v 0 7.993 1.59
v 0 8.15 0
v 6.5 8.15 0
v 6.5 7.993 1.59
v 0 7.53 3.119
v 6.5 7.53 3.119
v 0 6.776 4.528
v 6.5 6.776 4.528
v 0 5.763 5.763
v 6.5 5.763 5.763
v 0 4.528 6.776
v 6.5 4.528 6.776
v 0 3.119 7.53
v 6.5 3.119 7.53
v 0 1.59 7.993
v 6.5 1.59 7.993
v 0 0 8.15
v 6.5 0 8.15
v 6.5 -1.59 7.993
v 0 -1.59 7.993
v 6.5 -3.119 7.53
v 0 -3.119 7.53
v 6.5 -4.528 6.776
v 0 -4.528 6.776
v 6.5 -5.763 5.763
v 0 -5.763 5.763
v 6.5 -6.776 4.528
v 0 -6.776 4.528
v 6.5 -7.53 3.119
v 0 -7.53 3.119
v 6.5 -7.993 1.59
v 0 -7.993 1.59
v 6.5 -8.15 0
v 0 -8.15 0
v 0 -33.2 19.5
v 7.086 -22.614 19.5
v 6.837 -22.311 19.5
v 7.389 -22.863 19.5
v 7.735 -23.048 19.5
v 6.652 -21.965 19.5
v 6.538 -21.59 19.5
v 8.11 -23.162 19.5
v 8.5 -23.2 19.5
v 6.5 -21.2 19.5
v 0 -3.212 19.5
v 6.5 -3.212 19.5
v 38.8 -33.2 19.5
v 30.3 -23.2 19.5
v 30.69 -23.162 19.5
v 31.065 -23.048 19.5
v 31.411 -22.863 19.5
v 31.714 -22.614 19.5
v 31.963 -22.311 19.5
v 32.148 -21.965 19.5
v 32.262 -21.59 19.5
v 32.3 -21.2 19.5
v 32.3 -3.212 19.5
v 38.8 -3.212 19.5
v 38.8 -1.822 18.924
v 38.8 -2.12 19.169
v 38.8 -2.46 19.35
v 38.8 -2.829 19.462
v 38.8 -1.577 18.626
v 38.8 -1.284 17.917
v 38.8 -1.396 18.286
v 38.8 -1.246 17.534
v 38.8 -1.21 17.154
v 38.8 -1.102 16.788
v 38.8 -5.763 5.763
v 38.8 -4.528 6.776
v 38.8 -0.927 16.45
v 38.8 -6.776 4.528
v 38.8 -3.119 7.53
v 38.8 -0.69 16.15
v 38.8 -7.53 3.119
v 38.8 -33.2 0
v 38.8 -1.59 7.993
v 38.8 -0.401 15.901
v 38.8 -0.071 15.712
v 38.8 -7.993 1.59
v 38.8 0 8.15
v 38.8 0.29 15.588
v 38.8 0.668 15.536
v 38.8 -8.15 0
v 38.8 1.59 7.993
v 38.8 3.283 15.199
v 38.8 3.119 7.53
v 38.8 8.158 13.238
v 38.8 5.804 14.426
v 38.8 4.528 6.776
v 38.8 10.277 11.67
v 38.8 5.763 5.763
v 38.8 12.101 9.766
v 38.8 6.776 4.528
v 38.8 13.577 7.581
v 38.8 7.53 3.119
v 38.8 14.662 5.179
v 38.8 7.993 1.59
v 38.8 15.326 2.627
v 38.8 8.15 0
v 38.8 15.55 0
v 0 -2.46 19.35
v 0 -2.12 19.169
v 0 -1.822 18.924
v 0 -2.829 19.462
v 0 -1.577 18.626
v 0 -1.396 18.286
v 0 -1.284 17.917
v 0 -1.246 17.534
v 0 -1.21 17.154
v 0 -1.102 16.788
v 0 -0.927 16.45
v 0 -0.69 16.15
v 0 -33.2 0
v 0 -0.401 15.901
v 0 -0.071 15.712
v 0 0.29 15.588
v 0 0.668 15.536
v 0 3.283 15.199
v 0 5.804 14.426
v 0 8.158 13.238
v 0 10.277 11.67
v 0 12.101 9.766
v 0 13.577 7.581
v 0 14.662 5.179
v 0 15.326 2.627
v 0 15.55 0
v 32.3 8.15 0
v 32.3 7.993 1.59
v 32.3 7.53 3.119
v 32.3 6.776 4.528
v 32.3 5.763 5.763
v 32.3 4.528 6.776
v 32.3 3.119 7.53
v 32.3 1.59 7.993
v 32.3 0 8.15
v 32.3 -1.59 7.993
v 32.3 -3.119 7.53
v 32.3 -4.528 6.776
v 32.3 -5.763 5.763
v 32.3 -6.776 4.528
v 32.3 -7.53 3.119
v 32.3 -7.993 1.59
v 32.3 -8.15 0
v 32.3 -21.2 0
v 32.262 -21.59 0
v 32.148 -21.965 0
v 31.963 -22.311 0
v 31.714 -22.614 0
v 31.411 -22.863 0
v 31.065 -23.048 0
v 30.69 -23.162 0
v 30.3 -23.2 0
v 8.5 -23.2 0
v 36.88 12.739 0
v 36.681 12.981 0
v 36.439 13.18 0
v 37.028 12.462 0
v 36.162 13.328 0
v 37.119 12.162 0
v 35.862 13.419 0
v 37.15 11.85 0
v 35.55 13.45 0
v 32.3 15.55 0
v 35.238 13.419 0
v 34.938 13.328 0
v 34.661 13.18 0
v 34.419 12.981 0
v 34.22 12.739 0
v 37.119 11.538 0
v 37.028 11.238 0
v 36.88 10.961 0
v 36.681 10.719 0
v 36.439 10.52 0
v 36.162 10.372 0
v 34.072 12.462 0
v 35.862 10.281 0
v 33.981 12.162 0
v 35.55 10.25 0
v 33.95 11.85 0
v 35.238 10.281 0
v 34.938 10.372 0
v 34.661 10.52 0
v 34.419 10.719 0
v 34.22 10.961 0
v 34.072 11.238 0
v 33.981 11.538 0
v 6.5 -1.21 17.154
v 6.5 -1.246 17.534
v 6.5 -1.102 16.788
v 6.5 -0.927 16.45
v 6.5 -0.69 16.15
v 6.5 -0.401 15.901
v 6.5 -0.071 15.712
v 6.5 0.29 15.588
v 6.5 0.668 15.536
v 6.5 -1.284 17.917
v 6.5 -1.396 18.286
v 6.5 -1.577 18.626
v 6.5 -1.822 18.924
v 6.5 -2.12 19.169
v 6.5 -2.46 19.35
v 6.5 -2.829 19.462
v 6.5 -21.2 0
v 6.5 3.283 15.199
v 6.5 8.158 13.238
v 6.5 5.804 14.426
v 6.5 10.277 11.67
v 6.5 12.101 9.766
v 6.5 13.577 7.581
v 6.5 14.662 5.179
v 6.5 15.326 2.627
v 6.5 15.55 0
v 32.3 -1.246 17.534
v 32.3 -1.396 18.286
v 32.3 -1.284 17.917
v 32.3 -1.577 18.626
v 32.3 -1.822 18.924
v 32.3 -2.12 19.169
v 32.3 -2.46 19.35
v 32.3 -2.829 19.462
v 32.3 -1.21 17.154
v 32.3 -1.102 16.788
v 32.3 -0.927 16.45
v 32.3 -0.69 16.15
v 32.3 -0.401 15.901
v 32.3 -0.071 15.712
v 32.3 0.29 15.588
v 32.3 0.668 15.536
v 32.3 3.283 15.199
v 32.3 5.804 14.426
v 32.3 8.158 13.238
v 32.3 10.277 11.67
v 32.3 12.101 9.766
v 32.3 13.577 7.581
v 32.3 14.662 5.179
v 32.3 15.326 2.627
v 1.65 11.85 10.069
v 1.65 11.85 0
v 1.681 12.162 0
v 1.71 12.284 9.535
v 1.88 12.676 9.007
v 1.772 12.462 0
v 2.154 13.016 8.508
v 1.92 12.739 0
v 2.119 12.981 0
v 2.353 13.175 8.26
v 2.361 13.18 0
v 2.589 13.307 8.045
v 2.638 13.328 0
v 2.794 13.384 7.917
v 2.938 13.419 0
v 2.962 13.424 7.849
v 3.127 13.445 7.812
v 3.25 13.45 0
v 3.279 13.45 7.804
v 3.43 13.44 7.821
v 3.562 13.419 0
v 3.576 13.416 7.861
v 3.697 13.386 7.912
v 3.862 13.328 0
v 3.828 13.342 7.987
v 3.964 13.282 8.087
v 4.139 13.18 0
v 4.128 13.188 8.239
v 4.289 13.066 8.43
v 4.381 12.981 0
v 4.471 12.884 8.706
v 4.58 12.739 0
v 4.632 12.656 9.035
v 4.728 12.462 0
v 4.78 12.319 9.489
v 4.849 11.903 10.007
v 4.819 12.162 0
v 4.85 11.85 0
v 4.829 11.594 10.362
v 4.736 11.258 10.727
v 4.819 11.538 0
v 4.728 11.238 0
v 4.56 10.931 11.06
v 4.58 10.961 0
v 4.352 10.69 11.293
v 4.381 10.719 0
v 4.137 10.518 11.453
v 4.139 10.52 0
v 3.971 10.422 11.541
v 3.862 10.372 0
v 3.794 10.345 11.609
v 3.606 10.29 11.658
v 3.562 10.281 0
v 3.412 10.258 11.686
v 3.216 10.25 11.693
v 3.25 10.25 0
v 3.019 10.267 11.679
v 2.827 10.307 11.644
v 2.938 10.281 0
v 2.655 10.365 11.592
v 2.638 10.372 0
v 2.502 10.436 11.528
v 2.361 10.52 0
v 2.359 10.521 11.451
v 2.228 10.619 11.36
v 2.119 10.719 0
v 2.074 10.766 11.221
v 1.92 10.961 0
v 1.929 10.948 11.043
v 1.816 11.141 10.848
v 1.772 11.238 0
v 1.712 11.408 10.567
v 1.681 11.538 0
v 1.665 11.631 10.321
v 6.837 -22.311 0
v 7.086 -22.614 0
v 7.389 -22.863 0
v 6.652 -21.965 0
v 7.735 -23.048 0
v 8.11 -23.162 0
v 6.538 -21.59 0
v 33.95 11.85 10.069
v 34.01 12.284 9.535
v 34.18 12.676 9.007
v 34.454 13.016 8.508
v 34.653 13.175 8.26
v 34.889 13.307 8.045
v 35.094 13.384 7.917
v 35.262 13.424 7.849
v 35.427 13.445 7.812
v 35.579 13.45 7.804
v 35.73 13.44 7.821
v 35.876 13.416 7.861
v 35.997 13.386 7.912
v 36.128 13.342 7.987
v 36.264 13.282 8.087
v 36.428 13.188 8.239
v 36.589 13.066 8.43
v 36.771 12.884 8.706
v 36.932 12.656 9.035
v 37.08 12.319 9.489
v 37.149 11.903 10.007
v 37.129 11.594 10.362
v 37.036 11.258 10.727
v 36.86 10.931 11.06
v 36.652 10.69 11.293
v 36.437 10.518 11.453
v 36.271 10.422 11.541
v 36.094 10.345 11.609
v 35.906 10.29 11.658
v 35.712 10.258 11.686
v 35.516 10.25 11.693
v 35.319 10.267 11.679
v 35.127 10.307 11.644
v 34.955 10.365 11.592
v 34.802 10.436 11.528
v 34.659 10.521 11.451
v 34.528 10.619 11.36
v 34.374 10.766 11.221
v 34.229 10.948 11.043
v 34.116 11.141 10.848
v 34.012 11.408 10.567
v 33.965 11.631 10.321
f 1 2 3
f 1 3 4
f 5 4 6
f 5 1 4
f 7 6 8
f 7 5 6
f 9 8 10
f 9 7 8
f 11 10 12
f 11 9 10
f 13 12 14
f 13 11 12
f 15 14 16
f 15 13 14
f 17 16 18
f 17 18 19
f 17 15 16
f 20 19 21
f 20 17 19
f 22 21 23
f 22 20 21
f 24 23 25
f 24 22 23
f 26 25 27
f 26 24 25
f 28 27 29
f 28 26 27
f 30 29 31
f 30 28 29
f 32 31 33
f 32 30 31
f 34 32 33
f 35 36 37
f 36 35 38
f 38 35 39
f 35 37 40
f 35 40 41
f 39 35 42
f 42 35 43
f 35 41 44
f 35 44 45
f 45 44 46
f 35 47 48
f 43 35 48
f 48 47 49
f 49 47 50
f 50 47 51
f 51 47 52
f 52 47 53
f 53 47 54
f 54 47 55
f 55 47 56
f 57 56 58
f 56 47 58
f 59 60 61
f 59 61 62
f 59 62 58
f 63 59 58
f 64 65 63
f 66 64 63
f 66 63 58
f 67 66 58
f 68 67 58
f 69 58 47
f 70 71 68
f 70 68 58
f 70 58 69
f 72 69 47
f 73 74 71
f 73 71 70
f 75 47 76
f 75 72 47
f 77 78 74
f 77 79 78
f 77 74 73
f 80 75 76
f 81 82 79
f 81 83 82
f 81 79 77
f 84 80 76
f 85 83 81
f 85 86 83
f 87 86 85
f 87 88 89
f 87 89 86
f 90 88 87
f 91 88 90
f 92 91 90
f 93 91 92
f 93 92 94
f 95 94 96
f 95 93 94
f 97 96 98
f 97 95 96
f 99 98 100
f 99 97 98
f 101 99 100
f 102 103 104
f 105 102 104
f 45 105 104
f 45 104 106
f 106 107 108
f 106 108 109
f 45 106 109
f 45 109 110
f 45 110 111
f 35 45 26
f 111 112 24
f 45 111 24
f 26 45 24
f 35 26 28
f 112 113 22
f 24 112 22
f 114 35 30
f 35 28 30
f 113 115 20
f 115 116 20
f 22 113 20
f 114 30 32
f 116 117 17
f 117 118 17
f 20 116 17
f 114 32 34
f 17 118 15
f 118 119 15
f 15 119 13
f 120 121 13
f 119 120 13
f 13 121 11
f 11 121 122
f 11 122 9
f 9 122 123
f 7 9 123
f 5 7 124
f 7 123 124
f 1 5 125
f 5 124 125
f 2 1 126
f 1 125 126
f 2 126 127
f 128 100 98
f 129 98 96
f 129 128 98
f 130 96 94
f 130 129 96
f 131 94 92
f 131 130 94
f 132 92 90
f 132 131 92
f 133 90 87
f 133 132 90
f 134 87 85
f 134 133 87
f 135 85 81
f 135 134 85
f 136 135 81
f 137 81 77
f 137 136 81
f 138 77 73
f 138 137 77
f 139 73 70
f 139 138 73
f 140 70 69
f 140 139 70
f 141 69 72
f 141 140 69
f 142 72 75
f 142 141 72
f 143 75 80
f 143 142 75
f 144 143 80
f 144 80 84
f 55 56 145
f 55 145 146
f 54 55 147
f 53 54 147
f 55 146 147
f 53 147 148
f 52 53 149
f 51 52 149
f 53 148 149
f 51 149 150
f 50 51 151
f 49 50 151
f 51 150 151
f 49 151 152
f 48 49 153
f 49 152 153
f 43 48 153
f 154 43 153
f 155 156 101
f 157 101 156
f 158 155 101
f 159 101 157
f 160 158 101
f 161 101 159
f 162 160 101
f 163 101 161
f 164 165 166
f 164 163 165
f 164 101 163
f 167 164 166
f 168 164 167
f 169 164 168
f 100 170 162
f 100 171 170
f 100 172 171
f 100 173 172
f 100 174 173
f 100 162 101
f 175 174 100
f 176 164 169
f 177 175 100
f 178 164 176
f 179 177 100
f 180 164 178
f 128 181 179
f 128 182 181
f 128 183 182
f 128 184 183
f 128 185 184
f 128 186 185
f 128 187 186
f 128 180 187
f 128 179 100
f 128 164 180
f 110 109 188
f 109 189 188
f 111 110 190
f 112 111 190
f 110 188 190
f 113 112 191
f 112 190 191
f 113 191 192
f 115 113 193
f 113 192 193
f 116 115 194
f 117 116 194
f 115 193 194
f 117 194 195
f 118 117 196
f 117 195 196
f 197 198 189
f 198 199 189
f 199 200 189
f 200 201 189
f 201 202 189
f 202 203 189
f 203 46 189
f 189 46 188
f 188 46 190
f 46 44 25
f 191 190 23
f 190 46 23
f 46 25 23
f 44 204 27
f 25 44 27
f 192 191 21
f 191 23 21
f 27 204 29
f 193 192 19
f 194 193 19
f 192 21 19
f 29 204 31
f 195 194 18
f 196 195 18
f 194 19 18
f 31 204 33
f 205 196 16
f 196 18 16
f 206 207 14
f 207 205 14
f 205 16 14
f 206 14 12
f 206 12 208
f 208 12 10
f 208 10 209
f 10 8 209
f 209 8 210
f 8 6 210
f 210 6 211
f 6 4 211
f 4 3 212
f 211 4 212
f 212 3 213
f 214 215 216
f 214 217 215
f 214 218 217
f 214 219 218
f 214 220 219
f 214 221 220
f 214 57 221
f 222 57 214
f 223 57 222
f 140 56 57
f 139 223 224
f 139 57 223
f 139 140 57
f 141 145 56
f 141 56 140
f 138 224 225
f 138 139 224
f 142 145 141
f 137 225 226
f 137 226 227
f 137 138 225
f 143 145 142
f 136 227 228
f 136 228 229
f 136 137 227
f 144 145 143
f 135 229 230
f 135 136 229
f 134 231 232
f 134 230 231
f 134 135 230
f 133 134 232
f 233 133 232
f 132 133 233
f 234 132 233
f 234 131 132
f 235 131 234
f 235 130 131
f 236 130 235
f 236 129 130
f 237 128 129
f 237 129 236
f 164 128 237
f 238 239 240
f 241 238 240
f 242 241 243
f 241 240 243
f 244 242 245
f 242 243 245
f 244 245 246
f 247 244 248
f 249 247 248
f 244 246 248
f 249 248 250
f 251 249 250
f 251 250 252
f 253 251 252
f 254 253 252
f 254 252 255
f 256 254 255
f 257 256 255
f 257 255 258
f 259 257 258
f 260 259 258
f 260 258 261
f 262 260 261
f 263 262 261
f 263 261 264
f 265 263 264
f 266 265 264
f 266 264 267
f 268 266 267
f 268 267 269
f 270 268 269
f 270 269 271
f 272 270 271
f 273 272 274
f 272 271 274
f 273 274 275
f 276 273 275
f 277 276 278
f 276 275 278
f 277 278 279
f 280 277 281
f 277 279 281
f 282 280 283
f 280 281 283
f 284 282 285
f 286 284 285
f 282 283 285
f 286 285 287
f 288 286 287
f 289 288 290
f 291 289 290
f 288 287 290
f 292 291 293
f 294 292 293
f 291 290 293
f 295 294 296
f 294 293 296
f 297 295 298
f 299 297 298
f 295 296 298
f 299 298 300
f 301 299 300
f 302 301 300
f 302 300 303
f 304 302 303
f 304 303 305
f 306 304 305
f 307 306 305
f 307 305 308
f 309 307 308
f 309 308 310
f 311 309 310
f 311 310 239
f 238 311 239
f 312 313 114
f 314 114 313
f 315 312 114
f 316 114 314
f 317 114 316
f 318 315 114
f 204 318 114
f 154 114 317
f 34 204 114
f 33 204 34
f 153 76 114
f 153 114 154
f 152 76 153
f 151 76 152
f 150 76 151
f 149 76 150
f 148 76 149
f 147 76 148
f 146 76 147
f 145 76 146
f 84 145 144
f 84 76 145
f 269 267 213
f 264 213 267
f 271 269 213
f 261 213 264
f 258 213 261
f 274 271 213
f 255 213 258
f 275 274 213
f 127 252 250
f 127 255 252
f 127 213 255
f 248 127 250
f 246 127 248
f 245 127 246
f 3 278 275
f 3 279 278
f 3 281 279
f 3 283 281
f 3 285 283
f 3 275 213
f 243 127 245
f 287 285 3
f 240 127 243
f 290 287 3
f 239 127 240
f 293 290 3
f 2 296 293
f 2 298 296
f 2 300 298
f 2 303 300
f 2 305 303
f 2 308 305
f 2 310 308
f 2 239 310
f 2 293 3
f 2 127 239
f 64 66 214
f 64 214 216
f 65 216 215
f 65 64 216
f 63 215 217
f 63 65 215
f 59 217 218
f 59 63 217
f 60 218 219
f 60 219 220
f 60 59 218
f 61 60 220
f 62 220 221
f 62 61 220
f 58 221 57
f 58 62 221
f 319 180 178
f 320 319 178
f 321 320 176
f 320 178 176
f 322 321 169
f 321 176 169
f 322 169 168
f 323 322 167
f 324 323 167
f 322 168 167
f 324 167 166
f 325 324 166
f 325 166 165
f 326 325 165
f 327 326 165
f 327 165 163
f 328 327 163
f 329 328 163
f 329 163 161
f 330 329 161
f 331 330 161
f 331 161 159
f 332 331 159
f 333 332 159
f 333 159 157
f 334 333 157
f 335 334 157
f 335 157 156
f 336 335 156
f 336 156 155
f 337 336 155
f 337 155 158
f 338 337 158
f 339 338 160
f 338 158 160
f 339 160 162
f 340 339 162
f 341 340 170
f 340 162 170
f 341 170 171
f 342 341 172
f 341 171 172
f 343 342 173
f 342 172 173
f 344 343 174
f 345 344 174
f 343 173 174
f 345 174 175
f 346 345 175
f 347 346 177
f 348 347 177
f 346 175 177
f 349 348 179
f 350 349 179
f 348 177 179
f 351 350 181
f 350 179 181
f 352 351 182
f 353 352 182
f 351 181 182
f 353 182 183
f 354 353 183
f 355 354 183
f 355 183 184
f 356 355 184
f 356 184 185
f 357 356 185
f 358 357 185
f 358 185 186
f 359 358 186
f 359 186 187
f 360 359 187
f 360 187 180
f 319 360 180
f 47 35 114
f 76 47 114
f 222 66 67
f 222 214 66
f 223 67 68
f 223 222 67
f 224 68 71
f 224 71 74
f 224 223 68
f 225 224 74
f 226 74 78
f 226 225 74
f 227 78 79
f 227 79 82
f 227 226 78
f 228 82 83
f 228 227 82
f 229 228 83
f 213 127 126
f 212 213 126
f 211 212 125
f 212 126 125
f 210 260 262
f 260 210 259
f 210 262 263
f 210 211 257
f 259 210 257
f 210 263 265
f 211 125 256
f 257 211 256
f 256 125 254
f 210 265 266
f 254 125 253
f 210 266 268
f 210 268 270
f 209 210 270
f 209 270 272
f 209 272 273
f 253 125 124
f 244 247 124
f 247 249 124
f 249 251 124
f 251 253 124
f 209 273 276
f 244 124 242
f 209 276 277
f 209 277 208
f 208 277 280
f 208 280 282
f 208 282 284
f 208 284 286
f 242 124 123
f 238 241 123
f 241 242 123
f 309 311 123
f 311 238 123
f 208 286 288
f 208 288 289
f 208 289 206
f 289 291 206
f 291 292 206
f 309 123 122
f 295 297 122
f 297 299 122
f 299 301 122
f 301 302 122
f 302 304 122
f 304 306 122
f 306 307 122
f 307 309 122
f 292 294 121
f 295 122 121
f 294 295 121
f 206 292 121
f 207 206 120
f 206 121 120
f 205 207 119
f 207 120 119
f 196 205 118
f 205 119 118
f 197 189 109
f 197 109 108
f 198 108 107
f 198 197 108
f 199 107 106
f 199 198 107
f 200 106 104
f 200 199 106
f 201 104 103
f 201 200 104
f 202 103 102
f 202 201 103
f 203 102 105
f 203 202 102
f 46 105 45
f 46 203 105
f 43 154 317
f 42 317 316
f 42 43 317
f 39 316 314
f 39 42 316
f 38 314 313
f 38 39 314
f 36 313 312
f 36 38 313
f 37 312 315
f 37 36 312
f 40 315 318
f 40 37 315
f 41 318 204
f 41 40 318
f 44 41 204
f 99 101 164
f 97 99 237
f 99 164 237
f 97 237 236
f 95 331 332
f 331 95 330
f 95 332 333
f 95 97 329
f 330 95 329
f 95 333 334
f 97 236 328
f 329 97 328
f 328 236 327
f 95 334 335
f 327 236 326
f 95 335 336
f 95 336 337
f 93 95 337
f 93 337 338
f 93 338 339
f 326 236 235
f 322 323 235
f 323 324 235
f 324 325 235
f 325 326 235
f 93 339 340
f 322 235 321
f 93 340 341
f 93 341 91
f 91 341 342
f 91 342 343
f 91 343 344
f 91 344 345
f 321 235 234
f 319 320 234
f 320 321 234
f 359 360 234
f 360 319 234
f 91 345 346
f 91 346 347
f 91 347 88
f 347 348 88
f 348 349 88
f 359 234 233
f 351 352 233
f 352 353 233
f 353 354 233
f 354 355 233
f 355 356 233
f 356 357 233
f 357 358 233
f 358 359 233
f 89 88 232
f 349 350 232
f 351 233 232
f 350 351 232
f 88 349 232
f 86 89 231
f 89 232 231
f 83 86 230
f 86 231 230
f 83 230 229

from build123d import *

# Parameters (mm, degrees)
SKETCH3_R            = 15.55
SKETCH3_R_2          = 8.15
BOSS_EXTRUDE4_DEPTH  = 6.5
SKETCH2_R            = 15.55
SKETCH2_R_2          = 8.15
BOSS_EXTRUDE5_DEPTH  = 6.5
CUT_EXTRUDE1_DEPTH   = 38.8
SKETCH5_R            = 1.6
CUT_EXTRUDE2_DEPTH   = 16.55
BOSS_EXTRUDE6_DEPTH  = 6.5
SKETCH9_W            = 6.5
SKETCH9_H            = 21.954006421
BOSS_EXTRUDE7_DEPTH  = 4
BOSS_EXTRUDE8_DEPTH  = 6.5
SKETCH12_W           = 6.5
SKETCH12_H           = 21.954006421
BOSS_EXTRUDE9_DEPTH  = 4
FILLET1_R            = 2
FILLET2_R            = 2
CUT_EXTRUDE3_DEPTH   = 39.8000001
SKETCH13_W           = 19.5
SKETCH13_H           = 10
BOSS_EXTRUDE10_DEPTH = 38.8
FILLET3_R            = 2


with BuildPart() as part:
    # Sketch3 → Boss-Extrude4 (new body)
    with BuildSketch(Plane(origin=(0, 0, 0), x_dir=(0, 0, -1), z_dir=(1, 0, 0))):
        Circle(SKETCH3_R)
        Circle(SKETCH3_R_2, mode=Mode.SUBTRACT)
    extrude(amount=BOSS_EXTRUDE4_DEPTH)


with BuildPart() as body_2:
    # Sketch2 → Boss-Extrude5 (new body)
    with BuildSketch(Plane(origin=(32.3, 0, 0), x_dir=(0, 0, -1), z_dir=(1, 0, 0))):
        Circle(SKETCH2_R)
        Circle(SKETCH2_R_2, mode=Mode.SUBTRACT)
    extrude(amount=BOSS_EXTRUDE5_DEPTH)


with BuildPart() as cut_extrude1_tool:
    # Sketch4 → Cut-Extrude1 (new body)
    with BuildSketch(Plane(origin=(0, 0, 0), x_dir=(0, 0, -1), z_dir=(1, 0, 0))):
        with BuildLine():
            Line((0, 15.55), (0, -15.55))
            ThreePointArc((0, -15.55), (15.55, 0), (0, 15.55))
        make_face()
    extrude(amount=CUT_EXTRUDE1_DEPTH)


with BuildPart() as part_1:
    add(part.part)

    # Cut-Extrude1: cut by cut_extrude1_tool
    add(cut_extrude1_tool.part, mode=Mode.SUBTRACT)


with BuildPart() as body_2_1:
    add(body_2.part)

    # Cut-Extrude1: cut by cut_extrude1_tool
    add(cut_extrude1_tool.part, mode=Mode.SUBTRACT)


with BuildPart() as cut_extrude2_tool:
    # Sketch5 → Cut-Extrude2 (new body, through all)
    with BuildSketch(Plane(origin=(0, 0, 0), x_dir=(-1, 0, 0), z_dir=(0, 0, -1))):
        with Locations((-35.55, 11.85)):
            Circle(SKETCH5_R)
        with Locations((-3.25, 11.85)):
            Circle(SKETCH5_R)
    extrude(amount=-CUT_EXTRUDE2_DEPTH)


with BuildPart() as part_2:
    add(part_1.part)

    # Cut-Extrude2: cut by cut_extrude2_tool
    add(cut_extrude2_tool.part, mode=Mode.SUBTRACT)

    # Sketch11 → Boss-Extrude8 (add)
    with BuildSketch(Plane.ZY):
        with BuildLine():
            ThreePointArc((15.5, -1.245993579), (10.545788255, -11.427547859), (0, -15.55))
            Line((0, -15.55), (0, -23.2))
            Line((0, -23.2), (15.5, -23.2))
            Line((15.5, -23.2), (15.5, -1.245993579))
        make_face()
    extrude(amount=-BOSS_EXTRUDE8_DEPTH)

    # Sketch12 → Boss-Extrude9 (add)
    with BuildSketch(Plane.XY.offset(15.5)):
        with Locations((3.25, -12.22299679)):
            Rectangle(SKETCH12_W, SKETCH12_H)
    extrude(amount=BOSS_EXTRUDE9_DEPTH)

    # Fillet2
    fillet2_edges = [part_2.edges().sort_by_distance(p)[0] for p in [
        (3.25, -1.245993579, 15.5),
    ]]
    fillet(fillet2_edges, radius=FILLET2_R)


with BuildPart() as body_2_2:
    add(body_2_1.part)

    # Cut-Extrude2: cut by cut_extrude2_tool
    add(cut_extrude2_tool.part, mode=Mode.SUBTRACT)

    # Sketch8 → Boss-Extrude6 (add)
    with BuildSketch(Plane(origin=(38.8, 0, 0), x_dir=(0, 0, -1), z_dir=(1, 0, 0))):
        with BuildLine():
            ThreePointArc((0, -19.2), (-8.691551143, -17.120074145), (-15.5, -11.330931118))
            Line((-15.5, -11.330931118), (-15.5, -23.2))
            Line((-15.5, -23.2), (0, -23.2))
            Line((0, -23.2), (0, -19.2))
        make_face()
        with BuildLine():
            ThreePointArc((0, -15.55), (-10.545788255, -11.427547859), (-15.5, -1.245993579))
            Line((-15.5, -1.245993579), (-15.5, -11.330931118))
            ThreePointArc((-15.5, -11.330931118), (-8.691551143, -17.120074145), (0, -19.2))
            Line((0, -19.2), (0, -15.55))
        make_face()
    extrude(amount=-BOSS_EXTRUDE6_DEPTH)

    # Sketch9 → Boss-Extrude7 (add)
    with BuildSketch(Plane.XY.offset(15.5)):
        with Locations((35.55, -12.22299679)):
            Rectangle(SKETCH9_W, SKETCH9_H)
    extrude(amount=BOSS_EXTRUDE7_DEPTH)

    # Fillet1
    fillet1_edges = [body_2_2.edges().sort_by_distance(p)[0] for p in [
        (35.55, -1.245993579, 15.5),
    ]]
    fillet(fillet1_edges, radius=FILLET1_R)


with BuildPart() as cut_extrude3_tool:
    # Sketch10 → Cut-Extrude3 (new body, through all)
    with BuildSketch(Plane(origin=(38.8, 0, 0), x_dir=(0, 0, -1), z_dir=(1, 0, 0))):
        with BuildLine():
            Line((-19.5, -3.212198374), (-19.5, -1.245993579))
            Line((-19.5, -1.245993579), (-17.533795206, -1.245993579))
            ThreePointArc((-17.533795206, -1.245993579), (-18.924111949, -1.82188163), (-19.5, -3.212198374))
        make_face()
    extrude(amount=-CUT_EXTRUDE3_DEPTH)


with BuildPart() as part_3:
    add(part_2.part)

    # Cut-Extrude3: cut by cut_extrude3_tool
    add(cut_extrude3_tool.part, mode=Mode.SUBTRACT)



with BuildPart() as body_2_3:
    add(body_2_2.part)

    # Cut-Extrude3: cut by cut_extrude3_tool
    add(cut_extrude3_tool.part, mode=Mode.SUBTRACT)


with BuildPart() as part_4:
    add(part_3.part)

    add(body_2_3.part)  # Boss-Extrude10 merges body 2
    # Sketch13 → Boss-Extrude10 (add)
    with BuildSketch(Plane(origin=(38.8, 0, 0), x_dir=(0, 0, -1), z_dir=(1, 0, 0))):
        with Locations((-9.75, -28.2)):
            Rectangle(SKETCH13_W, SKETCH13_H)
    extrude(amount=-BOSS_EXTRUDE10_DEPTH)

    # Fillet3
    fillet3_edges = [part_4.edges().sort_by_distance(p)[0] for p in [
        (6.5, -23.2, 9.75),
        (32.3, -23.2, 9.75),
    ]]
    fillet(fillet3_edges, radius=FILLET3_R)


solid = part_4.part
